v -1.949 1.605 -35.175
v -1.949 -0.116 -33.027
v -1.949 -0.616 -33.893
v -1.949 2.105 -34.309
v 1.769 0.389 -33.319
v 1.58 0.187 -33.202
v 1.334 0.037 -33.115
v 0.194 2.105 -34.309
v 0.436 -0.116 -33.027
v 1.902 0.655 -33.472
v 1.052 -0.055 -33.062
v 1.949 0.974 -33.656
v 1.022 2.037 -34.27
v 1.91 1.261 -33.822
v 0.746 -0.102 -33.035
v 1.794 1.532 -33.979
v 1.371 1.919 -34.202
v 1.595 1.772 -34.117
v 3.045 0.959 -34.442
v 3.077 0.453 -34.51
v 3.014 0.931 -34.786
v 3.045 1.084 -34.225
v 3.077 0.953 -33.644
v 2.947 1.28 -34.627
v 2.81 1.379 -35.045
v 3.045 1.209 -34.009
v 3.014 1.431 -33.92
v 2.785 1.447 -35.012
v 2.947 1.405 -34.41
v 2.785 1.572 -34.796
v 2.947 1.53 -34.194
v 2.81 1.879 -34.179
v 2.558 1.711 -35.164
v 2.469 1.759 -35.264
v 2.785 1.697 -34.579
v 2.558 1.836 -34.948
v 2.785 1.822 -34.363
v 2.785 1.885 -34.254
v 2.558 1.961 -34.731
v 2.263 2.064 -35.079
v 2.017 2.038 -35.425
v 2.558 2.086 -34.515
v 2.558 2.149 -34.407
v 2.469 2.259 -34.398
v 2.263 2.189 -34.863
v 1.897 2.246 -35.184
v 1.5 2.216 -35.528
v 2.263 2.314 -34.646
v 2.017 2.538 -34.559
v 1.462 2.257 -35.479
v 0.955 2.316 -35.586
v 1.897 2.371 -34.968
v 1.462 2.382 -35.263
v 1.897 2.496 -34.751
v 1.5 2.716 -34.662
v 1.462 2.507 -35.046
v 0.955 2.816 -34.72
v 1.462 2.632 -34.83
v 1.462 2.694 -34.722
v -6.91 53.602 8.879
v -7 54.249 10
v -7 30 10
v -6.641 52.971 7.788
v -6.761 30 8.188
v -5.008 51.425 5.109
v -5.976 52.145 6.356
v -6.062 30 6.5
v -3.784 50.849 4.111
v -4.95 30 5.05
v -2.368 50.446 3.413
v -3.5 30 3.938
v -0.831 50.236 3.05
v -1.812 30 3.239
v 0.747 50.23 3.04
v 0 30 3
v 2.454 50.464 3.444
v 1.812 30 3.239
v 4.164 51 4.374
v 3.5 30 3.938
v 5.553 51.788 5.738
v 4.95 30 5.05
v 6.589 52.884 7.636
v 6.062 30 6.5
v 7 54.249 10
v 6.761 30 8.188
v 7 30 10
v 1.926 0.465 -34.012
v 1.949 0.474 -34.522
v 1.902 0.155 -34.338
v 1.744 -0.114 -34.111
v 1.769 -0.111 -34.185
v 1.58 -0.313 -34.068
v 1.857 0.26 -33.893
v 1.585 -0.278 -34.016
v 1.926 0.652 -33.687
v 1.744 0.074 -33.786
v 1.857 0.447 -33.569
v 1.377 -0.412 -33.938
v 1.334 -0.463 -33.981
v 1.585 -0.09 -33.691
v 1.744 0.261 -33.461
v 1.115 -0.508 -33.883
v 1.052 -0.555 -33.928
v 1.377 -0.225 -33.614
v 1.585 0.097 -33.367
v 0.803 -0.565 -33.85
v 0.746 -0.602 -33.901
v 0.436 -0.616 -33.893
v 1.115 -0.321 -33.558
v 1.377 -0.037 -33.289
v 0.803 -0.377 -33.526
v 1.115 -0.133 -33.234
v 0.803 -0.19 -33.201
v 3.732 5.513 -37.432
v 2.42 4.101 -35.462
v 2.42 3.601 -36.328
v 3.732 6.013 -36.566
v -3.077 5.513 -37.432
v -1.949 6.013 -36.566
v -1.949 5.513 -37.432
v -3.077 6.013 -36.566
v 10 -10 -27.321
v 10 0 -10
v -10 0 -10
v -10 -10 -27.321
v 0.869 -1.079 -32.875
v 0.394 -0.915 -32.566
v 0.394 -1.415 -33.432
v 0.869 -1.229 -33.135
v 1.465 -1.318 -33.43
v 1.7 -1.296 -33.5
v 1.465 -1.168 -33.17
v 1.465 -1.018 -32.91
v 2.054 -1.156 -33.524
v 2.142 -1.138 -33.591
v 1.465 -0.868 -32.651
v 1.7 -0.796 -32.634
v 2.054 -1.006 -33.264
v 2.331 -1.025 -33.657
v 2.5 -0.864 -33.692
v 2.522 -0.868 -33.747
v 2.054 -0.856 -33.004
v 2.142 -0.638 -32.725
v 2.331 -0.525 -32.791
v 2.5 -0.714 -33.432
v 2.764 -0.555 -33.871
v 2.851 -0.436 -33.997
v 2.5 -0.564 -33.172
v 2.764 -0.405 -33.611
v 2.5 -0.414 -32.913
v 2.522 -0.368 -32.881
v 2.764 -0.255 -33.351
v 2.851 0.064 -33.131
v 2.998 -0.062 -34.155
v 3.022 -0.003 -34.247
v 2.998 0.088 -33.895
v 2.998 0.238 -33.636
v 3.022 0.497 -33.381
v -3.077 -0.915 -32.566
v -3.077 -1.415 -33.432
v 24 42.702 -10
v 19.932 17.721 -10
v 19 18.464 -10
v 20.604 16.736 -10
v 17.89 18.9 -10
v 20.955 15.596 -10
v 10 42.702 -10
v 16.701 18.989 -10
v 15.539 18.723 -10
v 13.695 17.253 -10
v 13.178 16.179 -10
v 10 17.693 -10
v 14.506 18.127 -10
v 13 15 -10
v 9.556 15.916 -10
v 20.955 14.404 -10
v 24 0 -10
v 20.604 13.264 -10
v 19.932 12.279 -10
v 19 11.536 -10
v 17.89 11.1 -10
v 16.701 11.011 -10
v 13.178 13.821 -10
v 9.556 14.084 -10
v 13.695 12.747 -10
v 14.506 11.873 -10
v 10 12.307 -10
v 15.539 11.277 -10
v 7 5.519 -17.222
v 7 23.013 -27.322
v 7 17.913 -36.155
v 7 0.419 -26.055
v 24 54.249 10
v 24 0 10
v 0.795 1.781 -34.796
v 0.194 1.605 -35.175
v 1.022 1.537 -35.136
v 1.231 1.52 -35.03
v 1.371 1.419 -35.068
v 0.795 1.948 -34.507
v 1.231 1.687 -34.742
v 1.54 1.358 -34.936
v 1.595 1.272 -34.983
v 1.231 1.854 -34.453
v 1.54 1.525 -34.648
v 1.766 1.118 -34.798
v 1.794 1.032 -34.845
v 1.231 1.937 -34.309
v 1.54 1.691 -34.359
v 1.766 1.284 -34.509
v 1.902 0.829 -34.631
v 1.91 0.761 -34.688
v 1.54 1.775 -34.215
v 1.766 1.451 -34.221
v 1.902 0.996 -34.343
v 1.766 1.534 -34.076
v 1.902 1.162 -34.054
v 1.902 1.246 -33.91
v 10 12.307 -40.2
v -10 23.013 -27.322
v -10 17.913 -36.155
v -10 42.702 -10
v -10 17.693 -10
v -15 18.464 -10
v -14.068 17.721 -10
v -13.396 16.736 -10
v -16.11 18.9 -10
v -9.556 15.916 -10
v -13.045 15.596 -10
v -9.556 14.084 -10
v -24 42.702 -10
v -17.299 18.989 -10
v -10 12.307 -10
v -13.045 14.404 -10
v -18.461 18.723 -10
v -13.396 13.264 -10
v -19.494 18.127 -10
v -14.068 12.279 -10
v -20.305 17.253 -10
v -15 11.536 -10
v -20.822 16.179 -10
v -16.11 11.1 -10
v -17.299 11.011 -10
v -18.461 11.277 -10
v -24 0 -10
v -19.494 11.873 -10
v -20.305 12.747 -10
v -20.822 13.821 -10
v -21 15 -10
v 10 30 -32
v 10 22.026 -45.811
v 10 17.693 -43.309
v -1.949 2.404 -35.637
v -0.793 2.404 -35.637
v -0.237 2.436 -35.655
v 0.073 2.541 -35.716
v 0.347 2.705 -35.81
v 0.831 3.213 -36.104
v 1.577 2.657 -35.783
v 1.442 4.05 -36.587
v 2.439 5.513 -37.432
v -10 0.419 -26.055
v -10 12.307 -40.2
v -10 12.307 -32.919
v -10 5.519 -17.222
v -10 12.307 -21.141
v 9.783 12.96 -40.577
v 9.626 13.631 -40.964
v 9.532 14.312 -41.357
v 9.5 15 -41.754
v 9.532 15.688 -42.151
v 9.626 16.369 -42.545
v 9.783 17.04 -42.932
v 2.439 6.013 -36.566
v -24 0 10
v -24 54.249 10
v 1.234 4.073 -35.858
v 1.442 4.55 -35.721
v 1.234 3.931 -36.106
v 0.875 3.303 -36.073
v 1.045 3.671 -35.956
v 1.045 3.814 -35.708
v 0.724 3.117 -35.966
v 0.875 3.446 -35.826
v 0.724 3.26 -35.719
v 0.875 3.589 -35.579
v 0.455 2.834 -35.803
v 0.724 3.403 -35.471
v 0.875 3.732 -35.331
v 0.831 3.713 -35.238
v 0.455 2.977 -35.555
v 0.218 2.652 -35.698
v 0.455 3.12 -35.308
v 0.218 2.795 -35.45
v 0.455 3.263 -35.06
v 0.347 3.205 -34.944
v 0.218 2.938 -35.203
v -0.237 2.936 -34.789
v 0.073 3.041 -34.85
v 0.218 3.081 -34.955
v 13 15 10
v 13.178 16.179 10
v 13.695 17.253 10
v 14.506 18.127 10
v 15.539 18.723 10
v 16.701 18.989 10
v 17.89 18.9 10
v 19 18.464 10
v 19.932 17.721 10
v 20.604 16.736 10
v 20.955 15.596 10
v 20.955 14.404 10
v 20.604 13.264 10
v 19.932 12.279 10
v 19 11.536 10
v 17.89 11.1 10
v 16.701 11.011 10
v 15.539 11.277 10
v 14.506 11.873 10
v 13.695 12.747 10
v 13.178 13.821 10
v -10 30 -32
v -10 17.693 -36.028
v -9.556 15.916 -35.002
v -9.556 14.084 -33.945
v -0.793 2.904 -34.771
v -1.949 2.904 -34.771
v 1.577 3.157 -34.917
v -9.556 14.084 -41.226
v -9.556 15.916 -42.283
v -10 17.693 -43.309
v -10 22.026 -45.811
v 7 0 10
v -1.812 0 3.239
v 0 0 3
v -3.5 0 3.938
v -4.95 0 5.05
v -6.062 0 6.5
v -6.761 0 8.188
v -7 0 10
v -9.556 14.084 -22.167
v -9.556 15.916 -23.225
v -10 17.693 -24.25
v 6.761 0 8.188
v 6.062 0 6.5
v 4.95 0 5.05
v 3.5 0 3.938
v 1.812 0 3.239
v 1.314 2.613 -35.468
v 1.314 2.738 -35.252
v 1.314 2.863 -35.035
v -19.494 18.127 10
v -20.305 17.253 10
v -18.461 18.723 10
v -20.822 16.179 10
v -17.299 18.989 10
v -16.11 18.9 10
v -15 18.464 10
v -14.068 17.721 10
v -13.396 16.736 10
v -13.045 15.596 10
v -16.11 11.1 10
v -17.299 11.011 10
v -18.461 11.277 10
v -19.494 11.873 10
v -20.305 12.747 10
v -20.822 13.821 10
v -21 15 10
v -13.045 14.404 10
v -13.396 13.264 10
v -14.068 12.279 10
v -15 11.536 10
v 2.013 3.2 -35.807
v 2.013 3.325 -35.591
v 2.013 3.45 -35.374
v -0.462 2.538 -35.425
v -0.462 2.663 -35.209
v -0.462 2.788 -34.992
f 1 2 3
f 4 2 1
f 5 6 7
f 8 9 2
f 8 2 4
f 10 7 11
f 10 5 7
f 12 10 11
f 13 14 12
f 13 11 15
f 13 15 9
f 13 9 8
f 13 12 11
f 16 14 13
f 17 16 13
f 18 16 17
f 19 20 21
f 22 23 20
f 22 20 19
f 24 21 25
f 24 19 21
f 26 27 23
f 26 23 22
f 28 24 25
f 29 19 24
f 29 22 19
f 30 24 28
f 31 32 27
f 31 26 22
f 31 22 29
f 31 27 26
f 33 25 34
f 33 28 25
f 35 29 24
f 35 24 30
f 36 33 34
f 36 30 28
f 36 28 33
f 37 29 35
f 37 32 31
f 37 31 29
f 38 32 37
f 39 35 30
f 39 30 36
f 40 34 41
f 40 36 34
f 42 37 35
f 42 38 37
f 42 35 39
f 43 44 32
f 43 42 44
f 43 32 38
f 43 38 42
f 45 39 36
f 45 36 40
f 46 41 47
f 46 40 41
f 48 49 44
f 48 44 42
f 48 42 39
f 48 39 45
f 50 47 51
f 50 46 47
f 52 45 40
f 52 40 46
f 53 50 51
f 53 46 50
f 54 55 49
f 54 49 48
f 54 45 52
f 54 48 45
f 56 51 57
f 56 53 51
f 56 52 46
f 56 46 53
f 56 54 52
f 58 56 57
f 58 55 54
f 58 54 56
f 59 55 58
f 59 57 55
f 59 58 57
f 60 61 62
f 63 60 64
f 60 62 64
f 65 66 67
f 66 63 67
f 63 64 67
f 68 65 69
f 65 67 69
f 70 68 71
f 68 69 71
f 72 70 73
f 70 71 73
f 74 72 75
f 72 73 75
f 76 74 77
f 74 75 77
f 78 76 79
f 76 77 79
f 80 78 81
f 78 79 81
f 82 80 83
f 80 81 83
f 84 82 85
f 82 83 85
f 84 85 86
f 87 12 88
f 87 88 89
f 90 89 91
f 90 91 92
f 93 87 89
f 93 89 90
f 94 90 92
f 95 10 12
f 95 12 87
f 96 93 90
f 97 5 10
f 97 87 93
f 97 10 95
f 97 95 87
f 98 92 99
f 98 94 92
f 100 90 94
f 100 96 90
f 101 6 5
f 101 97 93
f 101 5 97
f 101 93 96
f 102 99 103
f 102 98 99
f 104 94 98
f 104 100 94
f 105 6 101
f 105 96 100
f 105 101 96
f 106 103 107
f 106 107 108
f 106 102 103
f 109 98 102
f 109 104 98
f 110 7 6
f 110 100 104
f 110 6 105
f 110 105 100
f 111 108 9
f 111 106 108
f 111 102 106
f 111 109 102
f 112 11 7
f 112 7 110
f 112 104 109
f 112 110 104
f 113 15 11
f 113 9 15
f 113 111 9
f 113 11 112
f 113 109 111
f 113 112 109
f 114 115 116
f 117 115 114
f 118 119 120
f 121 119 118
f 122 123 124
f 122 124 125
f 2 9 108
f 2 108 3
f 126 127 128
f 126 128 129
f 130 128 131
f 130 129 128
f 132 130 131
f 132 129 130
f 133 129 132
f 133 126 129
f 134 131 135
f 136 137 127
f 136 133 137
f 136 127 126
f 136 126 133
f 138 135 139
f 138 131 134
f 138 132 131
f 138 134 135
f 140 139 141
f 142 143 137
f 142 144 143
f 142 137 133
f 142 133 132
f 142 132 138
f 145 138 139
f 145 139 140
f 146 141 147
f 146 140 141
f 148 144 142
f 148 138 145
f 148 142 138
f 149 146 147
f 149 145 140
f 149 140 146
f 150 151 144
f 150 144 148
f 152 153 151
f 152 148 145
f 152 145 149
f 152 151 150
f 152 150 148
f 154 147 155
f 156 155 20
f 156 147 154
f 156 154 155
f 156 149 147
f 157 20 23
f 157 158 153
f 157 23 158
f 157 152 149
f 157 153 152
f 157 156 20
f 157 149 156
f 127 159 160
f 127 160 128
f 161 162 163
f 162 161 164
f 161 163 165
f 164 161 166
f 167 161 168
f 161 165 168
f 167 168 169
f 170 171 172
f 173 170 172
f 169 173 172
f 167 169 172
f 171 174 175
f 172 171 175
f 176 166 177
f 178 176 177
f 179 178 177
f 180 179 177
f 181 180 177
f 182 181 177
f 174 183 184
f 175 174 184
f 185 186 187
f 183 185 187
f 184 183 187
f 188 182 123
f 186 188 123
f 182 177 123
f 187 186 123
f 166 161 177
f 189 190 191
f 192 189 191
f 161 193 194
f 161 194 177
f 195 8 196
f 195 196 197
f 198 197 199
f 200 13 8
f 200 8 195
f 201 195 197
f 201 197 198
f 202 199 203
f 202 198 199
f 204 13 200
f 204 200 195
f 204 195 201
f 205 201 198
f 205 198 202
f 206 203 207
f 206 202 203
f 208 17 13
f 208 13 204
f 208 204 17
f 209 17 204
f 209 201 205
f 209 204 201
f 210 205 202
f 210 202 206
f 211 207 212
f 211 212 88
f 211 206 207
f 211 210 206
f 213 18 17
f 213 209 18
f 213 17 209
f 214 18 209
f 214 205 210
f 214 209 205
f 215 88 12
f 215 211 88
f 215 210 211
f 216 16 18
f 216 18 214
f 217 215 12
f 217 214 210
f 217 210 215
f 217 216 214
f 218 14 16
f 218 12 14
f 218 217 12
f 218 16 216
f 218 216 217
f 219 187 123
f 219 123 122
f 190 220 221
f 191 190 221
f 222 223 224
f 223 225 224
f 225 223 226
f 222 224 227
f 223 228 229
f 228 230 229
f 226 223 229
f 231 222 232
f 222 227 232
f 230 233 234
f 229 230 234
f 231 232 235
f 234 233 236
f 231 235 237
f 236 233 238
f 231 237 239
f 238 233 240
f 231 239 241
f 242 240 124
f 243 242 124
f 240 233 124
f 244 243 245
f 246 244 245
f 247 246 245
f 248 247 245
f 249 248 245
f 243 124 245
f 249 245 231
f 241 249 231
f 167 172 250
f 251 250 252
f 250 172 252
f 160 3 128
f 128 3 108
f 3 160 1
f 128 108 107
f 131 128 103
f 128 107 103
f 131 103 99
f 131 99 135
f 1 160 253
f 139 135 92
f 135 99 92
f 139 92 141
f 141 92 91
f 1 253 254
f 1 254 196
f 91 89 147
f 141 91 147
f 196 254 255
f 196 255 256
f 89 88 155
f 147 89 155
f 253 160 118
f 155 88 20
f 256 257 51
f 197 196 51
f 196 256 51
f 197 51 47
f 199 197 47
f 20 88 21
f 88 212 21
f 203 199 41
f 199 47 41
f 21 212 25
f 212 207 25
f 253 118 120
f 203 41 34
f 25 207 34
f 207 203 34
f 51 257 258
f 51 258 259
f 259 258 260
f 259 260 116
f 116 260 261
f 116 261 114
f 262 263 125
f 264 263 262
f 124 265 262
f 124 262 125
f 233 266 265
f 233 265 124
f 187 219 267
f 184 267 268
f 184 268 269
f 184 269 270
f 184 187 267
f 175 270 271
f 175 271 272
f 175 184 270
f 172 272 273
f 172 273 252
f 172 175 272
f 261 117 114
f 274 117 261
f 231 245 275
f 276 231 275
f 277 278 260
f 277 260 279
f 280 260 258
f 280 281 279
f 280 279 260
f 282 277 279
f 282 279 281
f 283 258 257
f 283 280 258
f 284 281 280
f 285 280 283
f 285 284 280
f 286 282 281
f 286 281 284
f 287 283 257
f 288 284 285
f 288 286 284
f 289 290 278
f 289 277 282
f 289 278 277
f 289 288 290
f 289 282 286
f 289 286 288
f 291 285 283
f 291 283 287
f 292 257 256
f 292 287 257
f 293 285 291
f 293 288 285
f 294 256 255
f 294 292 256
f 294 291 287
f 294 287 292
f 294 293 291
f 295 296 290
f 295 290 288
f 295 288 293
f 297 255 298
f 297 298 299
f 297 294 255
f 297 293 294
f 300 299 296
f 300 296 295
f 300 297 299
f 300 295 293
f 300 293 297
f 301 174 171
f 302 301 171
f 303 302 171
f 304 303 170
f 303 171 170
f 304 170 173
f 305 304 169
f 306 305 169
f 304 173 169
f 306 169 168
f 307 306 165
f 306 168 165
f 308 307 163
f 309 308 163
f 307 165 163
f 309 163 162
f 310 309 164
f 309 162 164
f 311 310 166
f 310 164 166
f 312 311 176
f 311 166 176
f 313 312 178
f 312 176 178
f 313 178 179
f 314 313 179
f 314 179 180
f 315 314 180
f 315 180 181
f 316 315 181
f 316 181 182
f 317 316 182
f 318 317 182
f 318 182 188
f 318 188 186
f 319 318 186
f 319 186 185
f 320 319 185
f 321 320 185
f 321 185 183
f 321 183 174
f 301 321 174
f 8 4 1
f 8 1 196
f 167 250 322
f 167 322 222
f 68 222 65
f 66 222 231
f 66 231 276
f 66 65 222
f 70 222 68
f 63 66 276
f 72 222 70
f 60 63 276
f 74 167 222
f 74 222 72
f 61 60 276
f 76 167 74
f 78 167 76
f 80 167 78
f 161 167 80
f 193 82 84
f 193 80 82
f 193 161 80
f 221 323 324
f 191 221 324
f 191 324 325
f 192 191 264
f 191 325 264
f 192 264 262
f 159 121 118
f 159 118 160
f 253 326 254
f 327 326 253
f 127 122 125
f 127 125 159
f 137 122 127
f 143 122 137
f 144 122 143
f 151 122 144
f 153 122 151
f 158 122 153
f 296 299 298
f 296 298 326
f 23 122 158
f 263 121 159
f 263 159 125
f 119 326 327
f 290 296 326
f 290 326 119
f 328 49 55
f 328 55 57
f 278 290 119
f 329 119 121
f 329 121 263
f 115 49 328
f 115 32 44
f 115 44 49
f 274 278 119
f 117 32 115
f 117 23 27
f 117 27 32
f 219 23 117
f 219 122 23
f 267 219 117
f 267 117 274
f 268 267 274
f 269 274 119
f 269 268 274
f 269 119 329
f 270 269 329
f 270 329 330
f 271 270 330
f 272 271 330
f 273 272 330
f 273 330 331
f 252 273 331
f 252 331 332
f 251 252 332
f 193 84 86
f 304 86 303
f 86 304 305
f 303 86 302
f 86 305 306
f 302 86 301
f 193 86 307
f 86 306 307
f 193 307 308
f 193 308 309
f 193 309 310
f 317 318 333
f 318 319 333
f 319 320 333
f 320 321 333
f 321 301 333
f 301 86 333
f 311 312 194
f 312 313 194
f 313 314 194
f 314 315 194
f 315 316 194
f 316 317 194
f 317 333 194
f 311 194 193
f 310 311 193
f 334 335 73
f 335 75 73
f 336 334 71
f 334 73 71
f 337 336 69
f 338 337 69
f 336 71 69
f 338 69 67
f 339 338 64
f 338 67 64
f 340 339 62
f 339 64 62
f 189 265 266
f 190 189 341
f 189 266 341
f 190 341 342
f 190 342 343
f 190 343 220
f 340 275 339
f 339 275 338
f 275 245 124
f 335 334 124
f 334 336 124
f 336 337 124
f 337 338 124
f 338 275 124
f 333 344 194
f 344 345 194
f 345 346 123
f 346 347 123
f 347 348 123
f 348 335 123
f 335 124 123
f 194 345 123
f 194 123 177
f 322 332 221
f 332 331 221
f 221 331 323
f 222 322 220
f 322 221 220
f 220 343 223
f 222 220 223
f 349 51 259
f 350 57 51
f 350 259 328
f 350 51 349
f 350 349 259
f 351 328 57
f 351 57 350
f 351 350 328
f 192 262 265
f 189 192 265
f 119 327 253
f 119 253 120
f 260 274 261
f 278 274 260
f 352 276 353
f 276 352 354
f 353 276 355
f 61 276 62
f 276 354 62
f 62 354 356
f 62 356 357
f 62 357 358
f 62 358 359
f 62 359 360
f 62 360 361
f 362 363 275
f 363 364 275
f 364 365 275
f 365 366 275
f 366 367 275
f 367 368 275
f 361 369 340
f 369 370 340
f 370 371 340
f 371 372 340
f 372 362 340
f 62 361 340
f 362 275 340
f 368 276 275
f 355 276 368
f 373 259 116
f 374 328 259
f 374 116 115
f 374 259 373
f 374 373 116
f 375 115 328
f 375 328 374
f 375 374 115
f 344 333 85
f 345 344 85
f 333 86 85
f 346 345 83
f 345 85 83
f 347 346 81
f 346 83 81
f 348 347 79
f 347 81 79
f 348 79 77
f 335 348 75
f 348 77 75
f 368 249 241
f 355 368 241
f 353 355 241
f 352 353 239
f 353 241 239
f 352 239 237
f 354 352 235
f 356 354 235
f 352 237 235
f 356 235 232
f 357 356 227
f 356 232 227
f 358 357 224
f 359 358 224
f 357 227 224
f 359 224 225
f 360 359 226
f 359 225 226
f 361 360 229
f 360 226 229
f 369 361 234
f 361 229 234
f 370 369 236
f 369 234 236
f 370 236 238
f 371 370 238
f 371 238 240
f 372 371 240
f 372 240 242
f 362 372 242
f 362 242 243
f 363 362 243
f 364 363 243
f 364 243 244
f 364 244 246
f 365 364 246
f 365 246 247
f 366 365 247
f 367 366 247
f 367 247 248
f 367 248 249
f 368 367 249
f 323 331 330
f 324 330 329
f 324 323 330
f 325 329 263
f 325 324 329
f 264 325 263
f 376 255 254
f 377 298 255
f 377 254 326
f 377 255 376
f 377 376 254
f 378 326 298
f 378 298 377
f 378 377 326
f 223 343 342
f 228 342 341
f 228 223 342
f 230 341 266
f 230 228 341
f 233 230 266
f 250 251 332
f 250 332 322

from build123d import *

# Parameters (mm, degrees)
SKETCH_1_W              = 48
SKETCH_1_H              = 20
EXTRUDE_1_DEPTH         = 30
SKETCH_2_W              = 14
SKETCH_2_H              = 30
CUT_EXTRUDE_1_DEPTH     = 7
EXTRUDE_2_DEPTH         = 48
CUT_EXTRUDE_2_DEPTH     = 14
CUT_EXTRUDE_3_DEPTH     = 14
CUT_EXTRUDE_4_DEPTH     = 65.456478054
SKETCH_13_R             = 4
CUT_EXTRUDE_5_DEPTH     = 53.52066051
SKETCH_14_R             = 4
CUT_EXTRUDE_6_DEPTH     = 53.52066051
FILLET_1_R              = 7
EXTRUDE_3_DEPTH         = 3
EXTRUDE_5_DEPTH         = 1
SKETCH_20_R             = 7.5
CUT_EXTRUDE_8_DEPTH     = 53.520660579
BOSS_EXTRUDE1_DEPTH     = 25
CUT_EXTRUDE1_DEPTH      = 80.244164279
CUT_EXTRUDE1_DEPTH_BACK = 80.244164279


with BuildPart() as part:
    # Эскиз1 → Бобышка-Вытянуть1 (new body)
    with BuildSketch(Plane(origin=(0, 0, 0), x_dir=(1, 0, 0), z_dir=(0, 1, 0))):
        Rectangle(SKETCH_1_W, SKETCH_1_H)
    extrude(amount=EXTRUDE_1_DEPTH)

    # Эскиз2 → Вырез-Вытянуть1 (cut)
    with BuildSketch(Plane.XY.offset(10)):
        with Locations((0, 15)):
            Rectangle(SKETCH_2_W, SKETCH_2_H)
    extrude(amount=-CUT_EXTRUDE_1_DEPTH, mode=Mode.SUBTRACT)

    # Эскиз7 → Бобышка-Вытянуть2 (add)
    with BuildSketch(Plane(origin=(24, 0, 0), x_dir=(0, 0, -1), z_dir=(1, 0, 0))):
        Polygon((10, 0), (27.320508076, -10), (45.810889132, 22.026279442), (32, 30), (10, 30), align=None)
    extrude(amount=-EXTRUDE_2_DEPTH)

    # Эскиз8 → Вырез-Вытянуть2 (cut)
    with BuildSketch(Plane(origin=(24, 0, 0), x_dir=(0, 0, -1), z_dir=(1, 0, 0))):
        Polygon((10, 0), (10, 30), (32, 30), (45.810889132, 22.026279442), (27.320508076, -10), align=None)
    extrude(amount=-CUT_EXTRUDE_2_DEPTH, mode=Mode.SUBTRACT)

    # Эскиз9 → Вырез-Вытянуть3 (cut)
    with BuildSketch(Plane.ZY.offset(24)):
        Polygon((-10, 0), (-10, 30), (-32, 30), (-45.810889132, 22.026279442), (-27.320508076, -10), align=None)
    extrude(amount=-CUT_EXTRUDE_3_DEPTH, mode=Mode.SUBTRACT)

    # Эскиз11 → Вырез-Вытянуть4 (cut, through all)
    with BuildSketch(Plane.ZY.offset(10)):
        Polygon((-17.221869062, 5.518829477), (-27.321869062, 23.012542633), (-36.15532818, 17.912542633), (-26.05532818, 0.418829477), align=None)
    extrude(amount=-CUT_EXTRUDE_4_DEPTH, mode=Mode.SUBTRACT)

    # Эскиз13 → Вырез-Вытянуть5 (cut, through all)
    with BuildSketch(Plane(origin=(0, 0, -10), x_dir=(-1, 0, 0), z_dir=(0, 0, -1))):
        with Locations((17, 15)):
            Circle(SKETCH_13_R)
    extrude(amount=-CUT_EXTRUDE_5_DEPTH, mode=Mode.SUBTRACT)

    # Эскиз14 → Вырез-Вытянуть6 (cut, through all)
    with BuildSketch(Plane(origin=(0, 0, -10), x_dir=(-1, 0, 0), z_dir=(0, 0, -1))):
        with Locations((-17, 15)):
            Circle(SKETCH_14_R)
    extrude(amount=-CUT_EXTRUDE_6_DEPTH, mode=Mode.SUBTRACT)

    # Скругление1
    fillet_1_edges = [part.edges().sort_by_distance(p)[0] for p in [
        (-7, 15, 3),
        (7, 15, 3),
    ]]
    fillet(fillet_1_edges, radius=FILLET_1_R - 0.0001)  # a hair under: the kernel refuses the full size

    # Эскиз16 → Бобышка-Вытянуть3 (add)
    with BuildSketch(Plane(origin=(10, 0, 0), x_dir=(0, 0, -1), z_dir=(1, 0, 0))):
        Polygon((27.321869062, 23.012542633), (17.221869062, 5.518829477), (26.05532818, 0.418829477), (36.15532818, 17.912542633), align=None)
    extrude(amount=-EXTRUDE_3_DEPTH)

    # Эскиз18 → Бобышка-Вытянуть5 (add)
    with BuildSketch(Plane(origin=(0, -14.330127019, -24.820508076), x_dir=(-1, 0, 0), z_dir=(0, -0.49999999999998845, -0.8660254037844453))):
        with BuildLine():
            Line((3.076923077, 23.490381057), (3.076923077, 15.490381057))
            Line((3.076923077, 15.490381057), (-0.394230769, 15.490381057))
            add(Edge.make_bspline(
                [(-0.394230769, 15.490381057), (-0.475966203, 15.49101845), (-0.634155568, 15.49225205), (-0.863556464, 15.501067061), (-1.077173272, 15.519794557), (-1.276352297, 15.540710881), (-1.460752713, 15.571594241), (-1.630462401, 15.607825992), (-1.784830485, 15.650647709), (-1.925031539, 15.701264755), (-2.055118116, 15.758511595), (-2.175664232, 15.829183977), (-2.291845901, 15.906492451), (-2.399031866, 15.998074814), (-2.502049745, 16.096470161), (-2.596586483, 16.206601733), (-2.685439891, 16.325713037), (-2.793473896, 16.498197991), (-2.906939016, 16.729401784), (-3.004668447, 17.02314385), (-3.06681146, 17.330727068), (-3.073519576, 17.5408315), (-3.076923077, 17.647432339)],
                knots=[0, 0, 0, 0, 1.242075696, 2.40389213, 3.487198984, 4.500157661, 5.446319301, 6.326791195, 7.136300648, 7.878370406, 8.590488565, 9.292260633, 9.999224673, 10.708050372, 11.431369221, 12.162165018, 12.910600795, 13.687589445, 15.252257874, 16.810406251, 18.381693487, 20, 20, 20, 20], degree=3))
            add(Edge.make_bspline(
                [(-3.076923077, 17.647432339), (-3.075357604, 17.715865612), (-3.072265688, 17.851026019), (-3.048581646, 18.049748215), (-3.005726368, 18.239618444), (-2.950775925, 18.42230348), (-2.87555432, 18.595200652), (-2.788453183, 18.761894703), (-2.680395045, 18.917607923), (-2.559742342, 19.067544403), (-2.419445088, 19.204937793), (-2.263386964, 19.331922341), (-2.086876234, 19.440896432), (-1.89570213, 19.542168691), (-1.684937787, 19.625339579), (-1.457761732, 19.698574242), (-1.21241575, 19.755040234), (-1.042362796, 19.783482773), (-0.955128205, 19.798073364)],
                knots=[0, 0, 0, 0, 0.982645791, 1.940792824, 2.867691729, 3.775150443, 4.675643875, 5.571354211, 6.471357401, 7.392684514, 8.331098131, 9.285922955, 10.275520706, 11.304845665, 12.388884831, 13.524255008, 14.729980297, 16, 16, 16, 16], degree=3))
            add(Edge.make_bspline(
                [(-0.955128205, 19.798073364), (-1.019738399, 19.830278555), (-1.14226585, 19.891352818), (-1.308999482, 19.992404668), (-1.455065559, 20.087536339), (-1.53803712, 20.158871679), (-1.576923077, 20.192304134)],
                knots=[0, 0, 0, 0, 1.172551213, 2.223638478, 3.167479604, 4, 4, 4, 4], degree=3))
            add(Edge.make_bspline(
                [(-1.576923077, 20.192304134), (-1.652624383, 20.266285408), (-1.807875296, 20.418008818), (-2.019735444, 20.678834883), (-2.229368535, 20.965668904), (-2.355227865, 21.174690137), (-2.419871795, 21.282047723)],
                knots=[0, 0, 0, 0, 0.918170575, 1.883016652, 2.912673989, 4, 4, 4, 4], degree=3))
            Line((-2.419871795, 21.282047723), (-3.732371795, 23.490381057))
            Line((-3.732371795, 23.490381057), (-2.439102564, 23.490381057))
            Line((-2.439102564, 23.490381057), (-1.442307692, 21.801278493))
            add(Edge.make_bspline(
                [(-1.442307692, 21.801278493), (-1.406465761, 21.74201577), (-1.337009983, 21.627174345), (-1.236719552, 21.459429826), (-1.138255761, 21.30508177), (-1.047376022, 21.15932531), (-0.958316878, 21.02600434), (-0.878481314, 20.900073272), (-0.798305584, 20.788666158), (-0.706246053, 20.654823189), (-0.593818414, 20.510114732), (-0.462623309, 20.361457059), (-0.34199814, 20.238315643), (-0.18956943, 20.120822362), (-3.2323e-05, 20.013245791), (0.159774488, 19.962214344), (0.237179487, 19.937496441)],
                knots=[0, 0, 0, 0, 1.130591283, 2.190900266, 3.190104209, 4.119071823, 4.994606968, 5.807262858, 6.55236009, 7.234593472, 8.459046683, 9.540234366, 10.471327768, 11.266723835, 12.676093724, 14, 14, 14, 14], degree=3))
            add(Edge.make_bspline(
                [(0.237179487, 19.937496441), (0.269697183, 19.931632396), (0.343936058, 19.918244603), (0.469993483, 19.909501015), (0.622727518, 19.900220866), (0.733416476, 19.900491258), (0.793269231, 19.900637467)],
                knots=[0, 0, 0, 0, 0.709978628, 1.620902492, 2.713552433, 4, 4, 4, 4], degree=3))
            Line((0.793269231, 19.900637467), (1.948717949, 19.900637467))
            Line((1.948717949, 19.900637467), (1.948717949, 23.490381057))
            Line((1.948717949, 23.490381057), (3.076923077, 23.490381057))
        make_face()
        with BuildLine():
            Line((1.948717949, 18.977560544), (-0.193910256, 18.977560544))
            add(Edge.make_bspline(
                [(-0.193910256, 18.977560544), (-0.301354607, 18.97589409), (-0.502211742, 18.972778811), (-0.783007271, 18.945769758), (-1.023200158, 18.903550736), (-1.225858519, 18.839427155), (-1.396173113, 18.753553027), (-1.54378517, 18.648537277), (-1.667901131, 18.51825252), (-1.769975791, 18.368861713), (-1.849770319, 18.206056724), (-1.90552669, 18.03374763), (-1.942959563, 17.855238544), (-1.946787014, 17.733092852), (-1.948717949, 17.6714708)],
                knots=[0, 0, 0, 0, 1.546056516, 2.890207646, 4.055830773, 5.050253158, 5.937355789, 6.790906573, 7.644595853, 8.512568064, 9.38593768, 10.244184789, 11.114197691, 12, 12, 12, 12], degree=3))
            add(Edge.make_bspline(
                [(-1.948717949, 17.6714708), (-1.947235583, 17.626563151), (-1.944332064, 17.538602257), (-1.928948857, 17.409542216), (-1.89968097, 17.287236957), (-1.859266003, 17.17080484), (-1.808094758, 17.059993077), (-1.745213393, 16.955237495), (-1.670946372, 16.857073145), (-1.585753391, 16.765016757), (-1.487970747, 16.681241729), (-1.376270424, 16.608965458), (-1.251544399, 16.547545272), (-1.113644587, 16.498798364), (-0.963006292, 16.459808698), (-0.798771701, 16.43387015), (-0.621691971, 16.415101097), (-0.498985984, 16.414015918), (-0.435897436, 16.41345798)],
                knots=[0, 0, 0, 0, 0.965235723, 1.89061323, 2.787065514, 3.661873922, 4.534873316, 5.404925039, 6.281839248, 7.175200054, 8.095223355, 9.040740021, 10.02630299, 11.075573487, 12.177989335, 13.364883635, 14.645170704, 16, 16, 16, 16], degree=3))
            Line((-0.435897436, 16.41345798), (1.948717949, 16.41345798))
            Line((1.948717949, 16.41345798), (1.948717949, 18.977560544))
        make_face(mode=Mode.SUBTRACT)
    extrude(amount=EXTRUDE_5_DEPTH)

    # Эскиз20 → Вырез-Вытянуть8 (cut, through all)
    with BuildSketch(Plane(origin=(0, 0, -10), x_dir=(-1, 0, 0), z_dir=(0, 0, -1))):
        with Locations((-17, 15)):
            Circle(SKETCH_20_R)
        with Locations((17, 15)):
            Circle(SKETCH_20_R)
    extrude(amount=CUT_EXTRUDE_8_DEPTH, mode=Mode.SUBTRACT)

    # Sketch3 → Boss-Extrude1 (add)
    with BuildSketch(Plane(origin=(0, 30, 0), x_dir=(1, 0, 0), z_dir=(0, 1, 0))):
        with BuildLine():
            Line((7, -10), (24, -10))
            Line((24, -10), (24, 10))
            Line((24, 10), (10, 10))
            Line((10, 10), (10, 32))
            Line((10, 32), (-10, 32))
            Line((-10, 32), (-10, 10))
            Line((-10, 10), (-24, 10))
            Line((-24, 10), (-24, -10))
            Line((-24, -10), (-7, -10))
            ThreePointArc((-7, -10), (0, -3), (7, -10))
        make_face()
    extrude(amount=BOSS_EXTRUDE1_DEPTH)

    # Sketch4 → Cut-Extrude1 (cut, two sides: drawn at the far end of the back side and taken through both)
    with BuildSketch(Plane.ZY.offset(10).offset(-CUT_EXTRUDE1_DEPTH_BACK)):
        Polygon((-251.050138586, -96.468656479), (-45.810889132, 22.026279442), (35.63071017, 69.046608722), (240.869959624, 187.541544642), (3.880087783, 598.020043549), (-488.040010426, 314.009842428), align=None)
    extrude(amount=CUT_EXTRUDE1_DEPTH + CUT_EXTRUDE1_DEPTH_BACK, mode=Mode.SUBTRACT)


solid = part.part
